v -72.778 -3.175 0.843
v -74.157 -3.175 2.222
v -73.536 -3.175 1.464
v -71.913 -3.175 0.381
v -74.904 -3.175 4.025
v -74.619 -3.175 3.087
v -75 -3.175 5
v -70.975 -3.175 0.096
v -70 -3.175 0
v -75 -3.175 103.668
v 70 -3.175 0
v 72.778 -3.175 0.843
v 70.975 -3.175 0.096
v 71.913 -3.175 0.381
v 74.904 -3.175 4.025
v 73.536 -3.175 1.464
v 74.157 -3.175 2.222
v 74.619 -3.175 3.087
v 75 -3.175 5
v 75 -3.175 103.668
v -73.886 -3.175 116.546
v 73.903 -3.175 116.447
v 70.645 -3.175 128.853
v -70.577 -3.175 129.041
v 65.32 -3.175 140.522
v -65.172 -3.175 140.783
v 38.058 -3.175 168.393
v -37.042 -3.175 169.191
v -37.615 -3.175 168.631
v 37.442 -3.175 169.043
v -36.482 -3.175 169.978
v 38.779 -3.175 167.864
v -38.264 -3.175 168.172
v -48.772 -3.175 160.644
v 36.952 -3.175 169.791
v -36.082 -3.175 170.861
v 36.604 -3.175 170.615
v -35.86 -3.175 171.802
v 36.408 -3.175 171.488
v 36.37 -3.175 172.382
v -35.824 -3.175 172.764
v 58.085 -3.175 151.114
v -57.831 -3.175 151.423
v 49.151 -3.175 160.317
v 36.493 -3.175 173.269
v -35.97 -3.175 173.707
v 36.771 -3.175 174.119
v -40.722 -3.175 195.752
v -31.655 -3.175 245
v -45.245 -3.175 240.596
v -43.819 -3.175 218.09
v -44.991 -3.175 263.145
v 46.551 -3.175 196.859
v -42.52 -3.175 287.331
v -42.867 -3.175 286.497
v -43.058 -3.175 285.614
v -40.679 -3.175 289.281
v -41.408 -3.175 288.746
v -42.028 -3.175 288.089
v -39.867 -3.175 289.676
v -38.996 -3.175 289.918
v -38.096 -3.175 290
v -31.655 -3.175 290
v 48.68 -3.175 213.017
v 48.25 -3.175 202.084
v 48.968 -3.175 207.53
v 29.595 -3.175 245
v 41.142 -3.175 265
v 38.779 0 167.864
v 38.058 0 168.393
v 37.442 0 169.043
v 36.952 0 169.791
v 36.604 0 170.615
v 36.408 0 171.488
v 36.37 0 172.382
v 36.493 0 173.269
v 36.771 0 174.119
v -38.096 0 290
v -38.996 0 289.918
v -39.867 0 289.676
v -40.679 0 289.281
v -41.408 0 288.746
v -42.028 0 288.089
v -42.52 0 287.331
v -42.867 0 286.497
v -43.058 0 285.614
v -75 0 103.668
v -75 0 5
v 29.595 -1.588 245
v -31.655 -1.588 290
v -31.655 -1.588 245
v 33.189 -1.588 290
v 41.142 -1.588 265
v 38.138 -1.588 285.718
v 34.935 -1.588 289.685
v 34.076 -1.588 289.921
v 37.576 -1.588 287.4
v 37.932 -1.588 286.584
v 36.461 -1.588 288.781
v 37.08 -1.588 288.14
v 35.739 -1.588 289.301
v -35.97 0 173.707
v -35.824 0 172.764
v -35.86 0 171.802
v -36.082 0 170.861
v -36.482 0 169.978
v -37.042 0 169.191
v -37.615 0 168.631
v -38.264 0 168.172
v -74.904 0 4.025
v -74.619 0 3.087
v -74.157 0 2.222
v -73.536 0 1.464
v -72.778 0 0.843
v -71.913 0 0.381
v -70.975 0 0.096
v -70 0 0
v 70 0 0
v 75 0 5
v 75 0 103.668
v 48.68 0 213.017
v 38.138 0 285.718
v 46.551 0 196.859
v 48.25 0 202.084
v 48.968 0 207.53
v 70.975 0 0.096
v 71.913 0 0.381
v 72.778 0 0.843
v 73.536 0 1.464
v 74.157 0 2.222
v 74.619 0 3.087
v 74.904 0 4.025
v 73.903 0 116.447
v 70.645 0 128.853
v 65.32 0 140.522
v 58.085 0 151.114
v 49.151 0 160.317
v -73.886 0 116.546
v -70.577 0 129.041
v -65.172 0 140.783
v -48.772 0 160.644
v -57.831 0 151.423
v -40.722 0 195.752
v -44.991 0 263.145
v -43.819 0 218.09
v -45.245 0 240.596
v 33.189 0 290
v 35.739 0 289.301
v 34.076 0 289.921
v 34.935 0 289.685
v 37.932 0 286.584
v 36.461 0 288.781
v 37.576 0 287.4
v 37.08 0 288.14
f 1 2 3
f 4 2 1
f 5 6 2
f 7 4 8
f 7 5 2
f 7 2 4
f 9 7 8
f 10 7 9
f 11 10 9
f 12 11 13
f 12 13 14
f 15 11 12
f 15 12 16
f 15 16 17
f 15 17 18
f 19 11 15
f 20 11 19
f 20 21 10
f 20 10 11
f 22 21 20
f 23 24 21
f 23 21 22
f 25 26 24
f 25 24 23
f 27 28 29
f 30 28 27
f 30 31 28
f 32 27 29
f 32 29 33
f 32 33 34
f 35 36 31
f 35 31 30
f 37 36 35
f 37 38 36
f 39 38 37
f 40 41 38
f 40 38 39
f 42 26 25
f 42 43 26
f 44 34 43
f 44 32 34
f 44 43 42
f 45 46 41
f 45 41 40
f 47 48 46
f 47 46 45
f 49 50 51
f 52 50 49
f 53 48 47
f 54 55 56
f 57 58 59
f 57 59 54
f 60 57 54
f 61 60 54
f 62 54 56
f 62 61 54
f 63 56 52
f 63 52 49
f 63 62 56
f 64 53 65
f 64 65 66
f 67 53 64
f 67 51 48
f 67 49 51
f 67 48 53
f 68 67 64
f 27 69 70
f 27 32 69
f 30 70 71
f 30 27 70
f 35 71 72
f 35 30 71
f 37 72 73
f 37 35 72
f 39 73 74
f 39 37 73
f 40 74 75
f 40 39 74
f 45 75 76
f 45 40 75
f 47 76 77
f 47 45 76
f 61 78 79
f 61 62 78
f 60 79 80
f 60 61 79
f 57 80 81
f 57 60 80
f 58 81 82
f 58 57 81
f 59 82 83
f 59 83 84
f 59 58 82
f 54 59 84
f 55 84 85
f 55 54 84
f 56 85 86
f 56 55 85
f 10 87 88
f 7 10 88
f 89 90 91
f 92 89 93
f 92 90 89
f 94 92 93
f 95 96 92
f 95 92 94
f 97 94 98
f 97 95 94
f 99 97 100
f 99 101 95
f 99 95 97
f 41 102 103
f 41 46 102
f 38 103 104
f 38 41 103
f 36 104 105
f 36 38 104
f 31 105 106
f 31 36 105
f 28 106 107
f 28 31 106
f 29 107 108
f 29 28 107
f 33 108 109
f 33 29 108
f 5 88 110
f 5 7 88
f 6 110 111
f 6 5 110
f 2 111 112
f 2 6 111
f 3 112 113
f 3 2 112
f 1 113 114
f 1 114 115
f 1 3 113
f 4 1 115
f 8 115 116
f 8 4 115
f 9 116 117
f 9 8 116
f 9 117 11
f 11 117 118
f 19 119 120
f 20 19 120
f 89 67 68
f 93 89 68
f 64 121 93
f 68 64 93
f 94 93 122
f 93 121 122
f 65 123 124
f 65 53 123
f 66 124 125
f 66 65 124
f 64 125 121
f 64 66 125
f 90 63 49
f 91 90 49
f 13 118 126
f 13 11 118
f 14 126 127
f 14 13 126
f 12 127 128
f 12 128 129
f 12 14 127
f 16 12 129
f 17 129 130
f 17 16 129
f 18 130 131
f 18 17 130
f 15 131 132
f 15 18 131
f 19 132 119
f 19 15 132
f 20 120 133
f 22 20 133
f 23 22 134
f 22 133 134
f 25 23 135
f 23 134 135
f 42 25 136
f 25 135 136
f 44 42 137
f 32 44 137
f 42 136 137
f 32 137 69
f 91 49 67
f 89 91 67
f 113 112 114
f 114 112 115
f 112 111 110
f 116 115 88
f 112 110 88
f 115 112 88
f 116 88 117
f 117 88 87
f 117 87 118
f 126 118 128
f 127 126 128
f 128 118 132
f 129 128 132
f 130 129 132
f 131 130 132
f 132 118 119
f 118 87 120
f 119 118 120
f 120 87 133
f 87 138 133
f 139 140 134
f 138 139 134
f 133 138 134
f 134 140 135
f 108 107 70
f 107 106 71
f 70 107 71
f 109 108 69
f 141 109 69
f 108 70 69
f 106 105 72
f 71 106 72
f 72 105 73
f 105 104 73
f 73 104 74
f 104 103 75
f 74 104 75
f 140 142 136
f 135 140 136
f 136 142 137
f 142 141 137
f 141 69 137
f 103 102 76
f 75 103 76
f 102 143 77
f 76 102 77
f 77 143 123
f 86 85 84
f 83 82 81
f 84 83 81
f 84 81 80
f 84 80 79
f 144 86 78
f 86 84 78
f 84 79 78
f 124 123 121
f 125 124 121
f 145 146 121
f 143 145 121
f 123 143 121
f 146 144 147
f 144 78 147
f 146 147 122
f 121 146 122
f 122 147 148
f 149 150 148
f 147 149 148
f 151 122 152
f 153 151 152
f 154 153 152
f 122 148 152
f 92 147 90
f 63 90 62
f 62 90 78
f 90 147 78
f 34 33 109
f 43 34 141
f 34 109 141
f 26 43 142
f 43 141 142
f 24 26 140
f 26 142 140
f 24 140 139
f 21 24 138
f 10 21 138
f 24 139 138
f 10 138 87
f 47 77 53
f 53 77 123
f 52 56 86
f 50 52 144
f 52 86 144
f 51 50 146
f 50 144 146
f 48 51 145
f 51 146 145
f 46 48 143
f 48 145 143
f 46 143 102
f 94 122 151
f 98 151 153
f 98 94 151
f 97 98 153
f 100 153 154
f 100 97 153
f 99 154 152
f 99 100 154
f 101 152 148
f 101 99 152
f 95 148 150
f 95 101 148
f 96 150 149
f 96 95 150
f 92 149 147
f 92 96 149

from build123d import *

# Parameters (mm, degrees)
F1_DEPTH = 3.175
F2_R     = 5
F3_R     = 30
F5_DEPTH = 1.5875


with BuildPart() as f1:
    # F0 (on Front) → F1 (new body)
    with BuildSketch(Plane.XZ):
        with BuildLine():
            Line((-75, 103.6675041929), (-75, 0))
            Line((-75, 0), (75, 0))
            Line((75, 0), (75, 103.6675041929))
            ThreePointArc((75, 103.6675041929), (64.2261628933, 142.397337655), (35, 170))
            Line((35, 170), (49.8954840004, 204.6374976635))
            Line((49.8954840004, 204.6374976635), (37.5165957212, 290))
            Line((37.5165957212, 290), (-42.4834042788, 290))
            ThreePointArc((-42.4834042788, 290), (-44.7601701514, 229.6246780894), (-35, 170))
            ThreePointArc((-35, 170), (-64.2261628933, 142.397337655), (-75, 103.6675041929))
        make_face()
    extrude(amount=F1_DEPTH)

    # F2
    f2_edges = [f1.edges().sort_by_distance(p)[0] for p in [
        (-35, -1.5875, 170),
        (-42.483404, -1.5875, 290),
        (37.516596, -1.5875, 290),
        (75, -1.5875, 0),
        (-75, -1.5875, 0),
        (35, -1.5875, 170),
    ]]
    fillet(f2_edges, radius=F2_R)

    # F3
    f3_edges = [f1.edges().sort_by_distance(p)[0] for p in [
        (49.895484, -1.5875, 204.637498),
    ]]
    fillet(f3_edges, radius=F3_R)

    # F4 (on face) → F5 (cut)
    with BuildSketch(Plane.XZ.offset(3.175)):
        with BuildLine():
            Line((33.1893731308, 290), (-31.6550214826, 290))
            Line((-31.6550214826, 290), (-31.6550214826, 245))
            Line((-31.6550214826, 245), (29.5949785174, 245))
            Line((29.5949785174, 245), (41.1419839012, 265))
            Line((41.1419839012, 265), (38.137614304, 285.7175718024))
            ThreePointArc((38.137614304, 285.7175718024), (36.461386348, 288.7807313454), (33.1893731308, 290))
        make_face()
    extrude(amount=-F5_DEPTH, mode=Mode.SUBTRACT)


solid = f1.part
